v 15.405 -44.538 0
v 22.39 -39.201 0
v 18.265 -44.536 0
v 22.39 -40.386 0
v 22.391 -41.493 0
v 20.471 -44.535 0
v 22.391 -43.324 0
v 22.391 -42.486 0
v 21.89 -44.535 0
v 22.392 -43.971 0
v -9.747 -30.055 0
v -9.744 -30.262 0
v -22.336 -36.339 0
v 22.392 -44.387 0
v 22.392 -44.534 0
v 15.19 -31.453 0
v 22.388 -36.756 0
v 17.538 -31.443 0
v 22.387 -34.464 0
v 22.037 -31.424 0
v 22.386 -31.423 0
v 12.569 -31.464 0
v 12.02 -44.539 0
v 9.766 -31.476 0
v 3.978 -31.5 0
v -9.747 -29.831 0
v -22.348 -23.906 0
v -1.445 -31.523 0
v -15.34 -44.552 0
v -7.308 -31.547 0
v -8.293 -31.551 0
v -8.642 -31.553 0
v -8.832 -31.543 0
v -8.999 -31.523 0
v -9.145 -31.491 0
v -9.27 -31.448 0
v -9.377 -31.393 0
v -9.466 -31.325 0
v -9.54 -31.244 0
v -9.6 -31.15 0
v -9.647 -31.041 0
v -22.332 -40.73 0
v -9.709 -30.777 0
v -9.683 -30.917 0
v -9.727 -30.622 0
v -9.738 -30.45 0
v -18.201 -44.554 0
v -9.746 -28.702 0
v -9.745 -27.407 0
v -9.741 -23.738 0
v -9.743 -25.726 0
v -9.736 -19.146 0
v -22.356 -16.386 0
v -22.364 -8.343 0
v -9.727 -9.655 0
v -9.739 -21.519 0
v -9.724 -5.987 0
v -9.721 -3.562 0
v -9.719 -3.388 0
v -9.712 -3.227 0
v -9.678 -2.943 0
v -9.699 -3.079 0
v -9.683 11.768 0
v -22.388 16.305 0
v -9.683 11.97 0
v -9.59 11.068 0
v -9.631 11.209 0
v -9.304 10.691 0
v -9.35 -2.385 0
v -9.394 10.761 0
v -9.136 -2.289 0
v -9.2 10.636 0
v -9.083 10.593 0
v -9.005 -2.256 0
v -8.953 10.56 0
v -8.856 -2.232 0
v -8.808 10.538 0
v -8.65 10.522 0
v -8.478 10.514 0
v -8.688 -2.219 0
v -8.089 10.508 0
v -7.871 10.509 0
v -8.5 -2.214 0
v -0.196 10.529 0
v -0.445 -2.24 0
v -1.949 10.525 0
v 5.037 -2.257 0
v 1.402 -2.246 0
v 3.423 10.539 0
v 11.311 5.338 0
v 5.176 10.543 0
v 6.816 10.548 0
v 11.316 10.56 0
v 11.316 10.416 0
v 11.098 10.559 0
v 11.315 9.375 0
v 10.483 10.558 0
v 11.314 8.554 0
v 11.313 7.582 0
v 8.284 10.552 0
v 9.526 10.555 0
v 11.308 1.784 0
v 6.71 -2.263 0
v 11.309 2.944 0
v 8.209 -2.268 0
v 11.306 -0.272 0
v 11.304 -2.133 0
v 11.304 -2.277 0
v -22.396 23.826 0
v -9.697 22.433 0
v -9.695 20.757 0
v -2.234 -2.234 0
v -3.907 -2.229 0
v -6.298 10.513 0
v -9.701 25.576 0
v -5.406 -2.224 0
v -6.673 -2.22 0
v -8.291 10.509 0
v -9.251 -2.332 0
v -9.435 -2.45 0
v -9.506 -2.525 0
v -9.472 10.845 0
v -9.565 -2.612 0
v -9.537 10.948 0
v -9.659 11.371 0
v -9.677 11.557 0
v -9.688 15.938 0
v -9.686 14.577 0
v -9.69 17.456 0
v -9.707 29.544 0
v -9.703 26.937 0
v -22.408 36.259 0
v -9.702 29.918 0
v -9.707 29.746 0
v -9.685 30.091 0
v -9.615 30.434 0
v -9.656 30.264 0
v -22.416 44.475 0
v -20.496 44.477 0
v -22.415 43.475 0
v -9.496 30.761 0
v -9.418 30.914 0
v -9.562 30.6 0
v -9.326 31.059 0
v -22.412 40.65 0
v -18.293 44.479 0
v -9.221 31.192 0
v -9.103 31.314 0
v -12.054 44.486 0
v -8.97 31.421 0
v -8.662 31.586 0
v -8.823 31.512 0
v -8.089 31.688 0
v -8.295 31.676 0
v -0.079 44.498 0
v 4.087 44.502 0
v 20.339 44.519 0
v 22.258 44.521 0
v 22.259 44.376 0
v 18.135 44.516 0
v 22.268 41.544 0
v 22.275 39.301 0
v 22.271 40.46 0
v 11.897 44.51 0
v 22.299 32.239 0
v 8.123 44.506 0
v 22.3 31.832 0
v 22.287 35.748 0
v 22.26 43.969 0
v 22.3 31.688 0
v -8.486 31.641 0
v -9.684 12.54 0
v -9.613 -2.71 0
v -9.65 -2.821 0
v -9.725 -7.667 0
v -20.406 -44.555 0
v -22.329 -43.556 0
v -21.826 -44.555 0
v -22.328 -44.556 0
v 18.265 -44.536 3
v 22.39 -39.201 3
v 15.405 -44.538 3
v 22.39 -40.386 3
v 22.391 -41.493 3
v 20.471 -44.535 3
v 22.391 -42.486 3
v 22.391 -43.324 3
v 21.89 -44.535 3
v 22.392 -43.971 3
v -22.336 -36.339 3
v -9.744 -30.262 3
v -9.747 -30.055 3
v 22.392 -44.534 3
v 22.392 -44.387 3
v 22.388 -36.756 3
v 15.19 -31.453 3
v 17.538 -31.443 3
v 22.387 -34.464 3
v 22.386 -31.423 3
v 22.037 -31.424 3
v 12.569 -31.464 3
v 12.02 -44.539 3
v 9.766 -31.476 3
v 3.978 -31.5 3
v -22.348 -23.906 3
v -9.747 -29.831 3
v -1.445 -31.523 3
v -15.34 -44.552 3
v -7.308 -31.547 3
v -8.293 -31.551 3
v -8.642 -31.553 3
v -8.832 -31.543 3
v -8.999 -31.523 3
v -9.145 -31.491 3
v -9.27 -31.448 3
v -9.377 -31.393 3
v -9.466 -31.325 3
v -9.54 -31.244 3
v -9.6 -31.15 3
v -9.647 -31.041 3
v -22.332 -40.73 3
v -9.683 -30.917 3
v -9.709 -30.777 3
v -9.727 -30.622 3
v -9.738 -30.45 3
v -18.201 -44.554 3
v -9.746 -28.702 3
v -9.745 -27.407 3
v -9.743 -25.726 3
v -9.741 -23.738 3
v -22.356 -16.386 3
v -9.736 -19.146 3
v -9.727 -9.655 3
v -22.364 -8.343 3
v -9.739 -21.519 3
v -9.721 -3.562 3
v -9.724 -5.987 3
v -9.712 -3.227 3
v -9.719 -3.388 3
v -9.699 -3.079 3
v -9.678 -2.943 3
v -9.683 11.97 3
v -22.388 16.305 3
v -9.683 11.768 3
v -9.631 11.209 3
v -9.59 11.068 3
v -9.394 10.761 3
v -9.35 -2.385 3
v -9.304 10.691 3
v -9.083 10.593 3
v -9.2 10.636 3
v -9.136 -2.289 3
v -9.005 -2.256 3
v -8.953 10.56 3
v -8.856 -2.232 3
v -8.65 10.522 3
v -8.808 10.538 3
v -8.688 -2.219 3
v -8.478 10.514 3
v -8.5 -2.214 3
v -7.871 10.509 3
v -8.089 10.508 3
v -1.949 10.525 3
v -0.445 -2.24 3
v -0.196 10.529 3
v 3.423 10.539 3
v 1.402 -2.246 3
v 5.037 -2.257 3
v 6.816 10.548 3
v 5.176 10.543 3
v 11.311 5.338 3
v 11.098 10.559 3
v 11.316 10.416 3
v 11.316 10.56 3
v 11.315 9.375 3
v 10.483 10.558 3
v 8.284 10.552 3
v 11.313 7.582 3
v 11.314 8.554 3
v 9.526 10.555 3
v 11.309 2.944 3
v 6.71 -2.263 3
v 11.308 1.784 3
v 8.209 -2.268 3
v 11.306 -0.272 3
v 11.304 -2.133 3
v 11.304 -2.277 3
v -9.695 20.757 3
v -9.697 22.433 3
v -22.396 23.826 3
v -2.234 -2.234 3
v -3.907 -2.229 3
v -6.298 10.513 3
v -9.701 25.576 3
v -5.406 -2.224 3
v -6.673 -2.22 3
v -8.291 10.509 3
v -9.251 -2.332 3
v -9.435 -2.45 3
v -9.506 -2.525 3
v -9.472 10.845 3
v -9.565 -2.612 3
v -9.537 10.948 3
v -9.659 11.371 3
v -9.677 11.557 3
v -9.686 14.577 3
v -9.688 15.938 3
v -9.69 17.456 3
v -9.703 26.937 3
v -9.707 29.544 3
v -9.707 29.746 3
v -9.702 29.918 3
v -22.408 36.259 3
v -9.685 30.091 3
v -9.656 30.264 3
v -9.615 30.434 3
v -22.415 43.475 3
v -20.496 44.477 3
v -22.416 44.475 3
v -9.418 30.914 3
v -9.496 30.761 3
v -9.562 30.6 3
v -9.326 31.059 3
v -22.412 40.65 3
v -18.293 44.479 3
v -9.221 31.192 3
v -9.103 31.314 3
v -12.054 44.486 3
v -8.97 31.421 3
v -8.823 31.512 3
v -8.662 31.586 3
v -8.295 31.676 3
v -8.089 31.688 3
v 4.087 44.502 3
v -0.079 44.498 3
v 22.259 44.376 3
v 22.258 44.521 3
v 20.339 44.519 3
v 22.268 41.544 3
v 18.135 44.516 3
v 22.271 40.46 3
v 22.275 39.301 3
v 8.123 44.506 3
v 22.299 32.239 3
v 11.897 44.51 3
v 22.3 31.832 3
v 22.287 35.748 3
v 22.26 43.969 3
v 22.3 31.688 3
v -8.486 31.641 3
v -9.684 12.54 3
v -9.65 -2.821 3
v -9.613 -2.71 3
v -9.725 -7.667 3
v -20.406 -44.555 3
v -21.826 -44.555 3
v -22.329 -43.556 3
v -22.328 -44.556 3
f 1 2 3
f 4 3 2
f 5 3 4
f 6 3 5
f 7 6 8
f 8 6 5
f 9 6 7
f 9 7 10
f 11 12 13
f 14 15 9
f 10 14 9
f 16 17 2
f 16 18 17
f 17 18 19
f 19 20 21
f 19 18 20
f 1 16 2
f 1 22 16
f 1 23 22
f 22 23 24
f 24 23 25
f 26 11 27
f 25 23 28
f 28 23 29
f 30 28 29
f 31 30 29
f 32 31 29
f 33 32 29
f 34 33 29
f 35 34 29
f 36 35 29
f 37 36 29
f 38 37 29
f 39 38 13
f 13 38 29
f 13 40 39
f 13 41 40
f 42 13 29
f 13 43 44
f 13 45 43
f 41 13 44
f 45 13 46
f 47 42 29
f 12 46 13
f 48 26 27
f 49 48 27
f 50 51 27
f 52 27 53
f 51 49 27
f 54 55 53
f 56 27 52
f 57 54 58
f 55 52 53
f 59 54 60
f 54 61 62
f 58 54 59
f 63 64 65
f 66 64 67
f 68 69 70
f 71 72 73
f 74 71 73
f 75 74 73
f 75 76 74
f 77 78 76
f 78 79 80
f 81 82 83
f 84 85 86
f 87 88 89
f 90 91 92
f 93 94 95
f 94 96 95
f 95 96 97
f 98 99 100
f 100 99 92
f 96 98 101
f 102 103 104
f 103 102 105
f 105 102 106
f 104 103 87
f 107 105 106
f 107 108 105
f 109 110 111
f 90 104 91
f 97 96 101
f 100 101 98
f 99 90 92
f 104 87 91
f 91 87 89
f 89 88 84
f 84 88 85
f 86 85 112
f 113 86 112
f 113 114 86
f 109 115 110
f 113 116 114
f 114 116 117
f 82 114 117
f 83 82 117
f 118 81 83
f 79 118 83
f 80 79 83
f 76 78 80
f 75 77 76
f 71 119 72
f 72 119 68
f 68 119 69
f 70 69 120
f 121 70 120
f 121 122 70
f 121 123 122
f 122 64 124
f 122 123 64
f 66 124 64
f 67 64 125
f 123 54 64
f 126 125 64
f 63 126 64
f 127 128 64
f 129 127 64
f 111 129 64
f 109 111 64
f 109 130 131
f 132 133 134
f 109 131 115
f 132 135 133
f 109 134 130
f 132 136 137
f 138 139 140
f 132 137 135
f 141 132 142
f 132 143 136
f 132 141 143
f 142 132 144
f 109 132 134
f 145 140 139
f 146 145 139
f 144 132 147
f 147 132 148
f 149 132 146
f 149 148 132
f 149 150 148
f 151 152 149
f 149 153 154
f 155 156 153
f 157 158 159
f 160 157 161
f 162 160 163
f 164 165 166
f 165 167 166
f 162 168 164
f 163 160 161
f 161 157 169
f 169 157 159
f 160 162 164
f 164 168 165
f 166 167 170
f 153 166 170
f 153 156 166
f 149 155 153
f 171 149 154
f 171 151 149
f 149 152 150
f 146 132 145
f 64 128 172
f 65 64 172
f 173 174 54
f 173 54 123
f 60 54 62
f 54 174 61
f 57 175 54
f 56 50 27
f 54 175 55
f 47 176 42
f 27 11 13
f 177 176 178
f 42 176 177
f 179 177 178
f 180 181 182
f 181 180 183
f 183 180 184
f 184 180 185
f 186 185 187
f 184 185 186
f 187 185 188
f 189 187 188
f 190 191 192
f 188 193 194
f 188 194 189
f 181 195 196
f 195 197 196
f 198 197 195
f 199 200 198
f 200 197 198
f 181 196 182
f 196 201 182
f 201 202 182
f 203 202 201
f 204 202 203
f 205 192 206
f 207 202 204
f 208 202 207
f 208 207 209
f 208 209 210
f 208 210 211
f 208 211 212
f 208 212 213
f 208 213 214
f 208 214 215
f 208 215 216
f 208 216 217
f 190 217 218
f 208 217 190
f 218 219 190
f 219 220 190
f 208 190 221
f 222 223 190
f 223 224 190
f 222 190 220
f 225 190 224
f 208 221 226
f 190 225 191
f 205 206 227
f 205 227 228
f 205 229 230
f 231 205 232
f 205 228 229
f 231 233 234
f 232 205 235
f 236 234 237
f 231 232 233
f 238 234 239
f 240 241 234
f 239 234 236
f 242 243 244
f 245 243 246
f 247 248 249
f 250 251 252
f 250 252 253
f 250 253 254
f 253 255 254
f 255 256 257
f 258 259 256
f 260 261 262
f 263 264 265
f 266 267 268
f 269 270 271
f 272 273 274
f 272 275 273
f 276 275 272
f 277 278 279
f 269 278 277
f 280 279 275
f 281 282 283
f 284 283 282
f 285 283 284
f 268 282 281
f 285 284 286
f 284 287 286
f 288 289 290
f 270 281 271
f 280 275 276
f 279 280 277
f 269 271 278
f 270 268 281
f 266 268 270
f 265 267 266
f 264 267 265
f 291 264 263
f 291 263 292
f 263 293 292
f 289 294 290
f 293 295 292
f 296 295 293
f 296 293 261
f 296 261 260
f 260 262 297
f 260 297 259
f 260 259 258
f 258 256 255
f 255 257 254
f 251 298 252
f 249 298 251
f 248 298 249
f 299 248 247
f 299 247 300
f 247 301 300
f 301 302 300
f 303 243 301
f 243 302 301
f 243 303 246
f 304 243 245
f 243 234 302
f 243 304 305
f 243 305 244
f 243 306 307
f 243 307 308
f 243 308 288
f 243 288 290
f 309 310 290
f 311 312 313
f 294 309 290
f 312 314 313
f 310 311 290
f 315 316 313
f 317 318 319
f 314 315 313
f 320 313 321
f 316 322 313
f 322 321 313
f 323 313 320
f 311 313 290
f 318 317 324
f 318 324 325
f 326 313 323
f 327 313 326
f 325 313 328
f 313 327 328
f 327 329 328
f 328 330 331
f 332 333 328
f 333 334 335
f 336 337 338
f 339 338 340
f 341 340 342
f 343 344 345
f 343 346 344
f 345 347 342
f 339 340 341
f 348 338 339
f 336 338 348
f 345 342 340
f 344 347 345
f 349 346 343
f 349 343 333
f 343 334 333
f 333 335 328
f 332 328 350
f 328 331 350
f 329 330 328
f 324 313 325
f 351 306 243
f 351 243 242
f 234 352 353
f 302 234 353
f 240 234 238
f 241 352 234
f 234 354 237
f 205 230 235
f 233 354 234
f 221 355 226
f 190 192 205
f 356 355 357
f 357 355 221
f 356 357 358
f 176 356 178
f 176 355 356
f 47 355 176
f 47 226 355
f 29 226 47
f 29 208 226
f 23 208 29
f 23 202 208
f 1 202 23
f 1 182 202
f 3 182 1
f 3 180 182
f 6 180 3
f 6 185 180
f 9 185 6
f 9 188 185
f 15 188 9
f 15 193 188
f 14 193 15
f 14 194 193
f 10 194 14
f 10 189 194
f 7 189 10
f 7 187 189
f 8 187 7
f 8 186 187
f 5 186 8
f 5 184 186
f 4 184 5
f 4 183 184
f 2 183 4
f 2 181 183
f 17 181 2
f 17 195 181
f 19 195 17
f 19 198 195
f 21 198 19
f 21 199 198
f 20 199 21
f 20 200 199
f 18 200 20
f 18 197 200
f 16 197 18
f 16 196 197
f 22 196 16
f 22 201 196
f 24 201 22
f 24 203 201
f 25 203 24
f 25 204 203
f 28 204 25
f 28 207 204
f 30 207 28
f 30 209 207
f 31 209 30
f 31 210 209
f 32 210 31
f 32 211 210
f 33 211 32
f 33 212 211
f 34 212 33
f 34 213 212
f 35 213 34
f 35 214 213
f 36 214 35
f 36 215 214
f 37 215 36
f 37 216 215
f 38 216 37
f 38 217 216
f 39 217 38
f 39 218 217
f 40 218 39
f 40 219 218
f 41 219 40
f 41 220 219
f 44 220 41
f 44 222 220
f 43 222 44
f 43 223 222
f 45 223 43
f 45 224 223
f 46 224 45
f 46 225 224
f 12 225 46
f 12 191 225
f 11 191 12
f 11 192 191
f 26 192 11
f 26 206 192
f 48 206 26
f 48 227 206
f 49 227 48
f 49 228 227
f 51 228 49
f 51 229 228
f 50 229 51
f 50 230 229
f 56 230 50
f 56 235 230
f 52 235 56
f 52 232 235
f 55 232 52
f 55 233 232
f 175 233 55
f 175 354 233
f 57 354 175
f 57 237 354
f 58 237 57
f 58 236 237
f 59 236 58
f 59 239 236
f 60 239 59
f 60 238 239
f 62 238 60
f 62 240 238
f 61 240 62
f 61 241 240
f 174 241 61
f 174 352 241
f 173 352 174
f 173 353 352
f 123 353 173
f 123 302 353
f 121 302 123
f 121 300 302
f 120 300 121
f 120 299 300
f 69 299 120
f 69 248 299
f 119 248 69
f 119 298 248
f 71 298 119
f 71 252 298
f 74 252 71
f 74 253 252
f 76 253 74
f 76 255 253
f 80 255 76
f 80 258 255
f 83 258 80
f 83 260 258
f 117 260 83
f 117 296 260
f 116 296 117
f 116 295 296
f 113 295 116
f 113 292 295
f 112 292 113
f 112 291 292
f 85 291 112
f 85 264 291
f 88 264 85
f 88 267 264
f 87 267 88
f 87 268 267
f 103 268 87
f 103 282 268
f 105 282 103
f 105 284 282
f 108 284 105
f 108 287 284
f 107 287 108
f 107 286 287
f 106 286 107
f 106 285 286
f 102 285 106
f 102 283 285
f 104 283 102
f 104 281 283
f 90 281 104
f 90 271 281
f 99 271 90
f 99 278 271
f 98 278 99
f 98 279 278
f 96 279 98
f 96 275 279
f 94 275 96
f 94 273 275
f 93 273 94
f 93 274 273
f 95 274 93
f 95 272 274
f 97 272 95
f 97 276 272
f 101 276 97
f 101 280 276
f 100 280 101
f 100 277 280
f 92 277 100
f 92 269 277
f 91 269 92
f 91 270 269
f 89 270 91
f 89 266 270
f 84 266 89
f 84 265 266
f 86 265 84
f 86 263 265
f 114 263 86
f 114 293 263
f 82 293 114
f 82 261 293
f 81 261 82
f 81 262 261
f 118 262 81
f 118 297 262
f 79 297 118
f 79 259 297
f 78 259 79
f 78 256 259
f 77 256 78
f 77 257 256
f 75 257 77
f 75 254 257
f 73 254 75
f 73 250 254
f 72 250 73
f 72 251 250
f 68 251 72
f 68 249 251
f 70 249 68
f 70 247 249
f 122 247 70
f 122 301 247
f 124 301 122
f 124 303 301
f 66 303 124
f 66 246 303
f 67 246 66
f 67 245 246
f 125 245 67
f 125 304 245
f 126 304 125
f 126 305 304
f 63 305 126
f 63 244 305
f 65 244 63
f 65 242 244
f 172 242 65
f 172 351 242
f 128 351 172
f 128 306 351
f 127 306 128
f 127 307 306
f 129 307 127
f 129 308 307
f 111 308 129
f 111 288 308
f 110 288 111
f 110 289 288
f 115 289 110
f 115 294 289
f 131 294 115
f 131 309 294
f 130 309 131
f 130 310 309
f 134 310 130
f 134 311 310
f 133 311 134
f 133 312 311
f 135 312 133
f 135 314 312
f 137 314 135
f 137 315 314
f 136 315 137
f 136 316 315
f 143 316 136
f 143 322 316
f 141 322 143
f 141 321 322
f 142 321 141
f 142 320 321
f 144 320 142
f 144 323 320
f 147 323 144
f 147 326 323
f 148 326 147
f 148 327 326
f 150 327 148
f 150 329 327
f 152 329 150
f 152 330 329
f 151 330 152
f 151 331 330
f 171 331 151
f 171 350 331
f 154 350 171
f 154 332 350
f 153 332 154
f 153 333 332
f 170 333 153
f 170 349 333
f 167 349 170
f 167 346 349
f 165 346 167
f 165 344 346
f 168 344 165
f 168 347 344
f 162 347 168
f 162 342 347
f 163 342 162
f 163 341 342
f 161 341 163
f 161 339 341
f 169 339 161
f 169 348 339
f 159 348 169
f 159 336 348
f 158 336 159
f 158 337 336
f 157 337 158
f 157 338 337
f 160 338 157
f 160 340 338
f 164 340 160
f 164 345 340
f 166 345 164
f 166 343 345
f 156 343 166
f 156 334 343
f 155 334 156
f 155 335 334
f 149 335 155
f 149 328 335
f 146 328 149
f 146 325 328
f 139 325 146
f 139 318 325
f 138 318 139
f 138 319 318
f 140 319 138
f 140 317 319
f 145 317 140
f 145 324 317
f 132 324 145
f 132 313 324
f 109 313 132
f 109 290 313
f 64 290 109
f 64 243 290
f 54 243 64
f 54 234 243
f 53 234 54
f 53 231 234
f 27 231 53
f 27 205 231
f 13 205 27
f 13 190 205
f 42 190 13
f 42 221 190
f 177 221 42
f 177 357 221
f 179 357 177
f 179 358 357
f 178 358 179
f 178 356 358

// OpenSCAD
// Generated from 交通部公路局（原交通部公路總局）「新式號牌使用之英文字、數字字體」author trace
fudge = 0.1;

module glyph_2012_E(h = 3) {
  difference() {
    linear_extrude(height = h)
      polygon(points = [[-22.4159, 44.4752], [-22.4149, 43.4754], [-22.4122, 40.6497], [-22.4078, 36.259], [-22.4022, 30.5642], [-22.3956, 23.826], [-22.3881, 16.3053], [-22.3802, 8.263], [-22.372, -0.0402], [-22.3638, -8.3434], [-22.3559, -16.3857], [-22.3484, -23.9064], [-22.3418, -30.6445], [-22.3362, -36.3394], [-22.3318, -40.7301], [-22.3291, -43.5558], [-22.3281, -44.5556], [-21.8258, -44.5554], [-20.4065, -44.5547], [-18.2011, -44.5537], [-15.3405, -44.5523], [-11.956, -44.5507], [-8.1783, -44.5489], [-4.1387, -44.547], [0.032, -44.545], [4.2027, -44.543], [8.2424, -44.5411], [12.02, -44.5393], [15.4046, -44.5376], [18.2651, -44.5363], [20.4706, -44.5352], [21.8899, -44.5346], [22.3921, -44.5343], [22.3921, -44.3871], [22.3919, -43.9709], [22.3915, -43.3243], [22.3912, -42.4856], [22.3907, -41.4933], [22.3902, -40.3858], [22.3896, -39.2014], [22.389, -37.9786], [22.3884, -36.7558], [22.3879, -35.5714], [22.3874, -34.4638], [22.3869, -33.4715], [22.3865, -32.6328], [22.3862, -31.9862], [22.386, -31.5701], [22.3859, -31.4228], [22.0375, -31.4243], [21.0527, -31.4284], [19.5225, -31.4348], [17.5379, -31.4431], [15.1896, -31.453], [12.5686, -31.4639], [9.7658, -31.4757], [6.8721, -31.4878], [3.9784, -31.4999], [1.1756, -31.5117], [-1.4454, -31.5227], [-3.7936, -31.5325], [-5.7783, -31.5408], [-7.3085, -31.5472], [-8.2933, -31.5514], [-8.6417, -31.5528], [-8.8322, -31.5429], [-8.9995, -31.5226], [-9.145, -31.4912], [-9.2704, -31.4482], [-9.3771, -31.3931], [-9.4665, -31.3253], [-9.5403, -31.2443], [-9.5999, -31.1496], [-9.6469, -31.0406], [-9.6826, -30.9167], [-9.7087, -30.7774], [-9.7267, -30.6221], [-9.738, -30.4504], [-9.7441, -30.2616], [-9.7466, -30.0552], [-9.7469, -29.8307], [-9.7466, -29.5357], [-9.7458, -28.702], [-9.7446, -27.4066], [-9.7429, -25.7263], [-9.741, -23.7383], [-9.7388, -21.5193], [-9.7365, -19.1465], [-9.7341, -16.6966], [-9.7317, -14.2468], [-9.7294, -11.874], [-9.7272, -9.655], [-9.7252, -7.6669], [-9.7236, -5.9867], [-9.7223, -4.6912], [-9.7215, -3.8575], [-9.7212, -3.5625], [-9.7189, -3.3879], [-9.7118, -3.2267], [-9.6986, -3.0786], [-9.6784, -2.9434], [-9.6501, -2.8208], [-9.6127, -2.7104], [-9.565, -2.612], [-9.506, -2.5252], [-9.4347, -2.4498], [-9.35, -2.3854], [-9.2508, -2.3318], [-9.136, -2.2886], [-9.0047, -2.2556], [-8.8556, -2.2324], [-8.6879, -2.2188], [-8.5004, -2.2144], [-8.2779, -2.2151], [-7.6494, -2.2171], [-6.6727, -2.2202], [-5.406, -2.2243], [-3.9071, -2.229], [-2.2343, -2.2344], [-0.4453, -2.2401], [1.4016, -2.2459], [3.2486, -2.2518], [5.0375, -2.2575], [6.7104, -2.2628], [8.2092, -2.2676], [9.476, -2.2716], [10.4527, -2.2747], [11.0812, -2.2767], [11.3036, -2.2774], [11.3038, -2.1333], [11.3042, -1.7258], [11.3048, -1.0927], [11.3056, -0.2716], [11.3066, 0.7], [11.3077, 1.7843], [11.3088, 2.944], [11.31, 4.1412], [11.3112, 5.3384], [11.3124, 6.498], [11.3135, 7.5824], [11.3144, 8.554], [11.3153, 9.3751], [11.3159, 10.0082], [11.3163, 10.4156], [11.3165, 10.5598], [11.0985, 10.5592], [10.4826, 10.5576], [9.5256, 10.555], [8.2843, 10.5518], [6.8156, 10.5479], [5.1764, 10.5435], [3.4235, 10.5389], [1.6137, 10.5341], [-0.1961, 10.5293], [-1.9491, 10.5247], [-3.5883, 10.5203], [-5.057, 10.5164], [-6.2983, 10.5131], [-7.2553, 10.5106], [-7.8712, 10.509], [-8.0891, 10.5084], [-8.2908, 10.5094], [-8.4778, 10.5136], [-8.6503, 10.5225], [-8.8085, 10.5376], [-8.9527, 10.5604], [-9.0831, 10.5926], [-9.2, 10.6357], [-9.3036, 10.6911], [-9.3942, 10.7606], [-9.4719, 10.8455], [-9.5371, 10.9476], [-9.5899, 11.0682], [-9.6306, 11.209], [-9.6595, 11.3715], [-9.6768, 11.5573], [-9.6827, 11.7678], [-9.683, 11.9697], [-9.6837, 12.5403], [-9.6849, 13.4269], [-9.6865, 14.5769], [-9.6883, 15.9375], [-9.6904, 17.4562], [-9.6926, 19.0802], [-9.6949, 20.7568], [-9.6971, 22.4335], [-9.6993, 24.0575], [-9.7014, 25.5761], [-9.7032, 26.9368], [-9.7048, 28.0867], [-9.706, 28.9733], [-9.7068, 29.5439], [-9.7071, 29.7458], [-9.7016, 29.918], [-9.6846, 30.0912], [-9.6559, 30.2638], [-9.6151, 30.4341], [-9.5621, 30.6004], [-9.4964, 30.7611], [-9.418, 30.9145], [-9.3264, 31.0588], [-9.2214, 31.1924], [-9.1028, 31.3137], [-8.9702, 31.4209], [-8.8235, 31.5124], [-8.6622, 31.5865], [-8.4863, 31.6415], [-8.2953, 31.6757], [-8.0891, 31.6875], [-7.7478, 31.6875], [-6.7833, 31.6875], [-5.2846, 31.6875], [-3.3408, 31.6875], [-1.0408, 31.6875], [1.5263, 31.6875], [4.2714, 31.6875], [7.1056, 31.6875], [9.9398, 31.6875], [12.6849, 31.6875], [15.252, 31.6875], [17.552, 31.6875], [19.4959, 31.6875], [20.9946, 31.6875], [21.9591, 31.6875], [22.3004, 31.6875], [22.2999, 31.8316], [22.2986, 32.2389], [22.2965, 32.8718], [22.2938, 33.6926], [22.2906, 34.6639], [22.287, 35.7479], [22.2832, 36.9072], [22.2793, 38.104], [22.2754, 39.3009], [22.2715, 40.4601], [22.268, 41.5442], [22.2648, 42.5154], [22.2621, 43.3363], [22.26, 43.9692], [22.2587, 44.3765], [22.2582, 44.5206], [21.7565, 44.5201], [20.3386, 44.5187], [18.1354, 44.5164], [15.2779, 44.5135], [11.8968, 44.5101], [8.123, 44.5062], [4.0875, 44.5022], [-0.0789, 44.4979], [-4.2453, 44.4937], [-8.2808, 44.4896], [-12.0545, 44.4858], [-15.4356, 44.4823], [-18.2932, 44.4794], [-20.4963, 44.4772], [-21.9142, 44.4757]]);
  }
}

glyph_2012_E();
